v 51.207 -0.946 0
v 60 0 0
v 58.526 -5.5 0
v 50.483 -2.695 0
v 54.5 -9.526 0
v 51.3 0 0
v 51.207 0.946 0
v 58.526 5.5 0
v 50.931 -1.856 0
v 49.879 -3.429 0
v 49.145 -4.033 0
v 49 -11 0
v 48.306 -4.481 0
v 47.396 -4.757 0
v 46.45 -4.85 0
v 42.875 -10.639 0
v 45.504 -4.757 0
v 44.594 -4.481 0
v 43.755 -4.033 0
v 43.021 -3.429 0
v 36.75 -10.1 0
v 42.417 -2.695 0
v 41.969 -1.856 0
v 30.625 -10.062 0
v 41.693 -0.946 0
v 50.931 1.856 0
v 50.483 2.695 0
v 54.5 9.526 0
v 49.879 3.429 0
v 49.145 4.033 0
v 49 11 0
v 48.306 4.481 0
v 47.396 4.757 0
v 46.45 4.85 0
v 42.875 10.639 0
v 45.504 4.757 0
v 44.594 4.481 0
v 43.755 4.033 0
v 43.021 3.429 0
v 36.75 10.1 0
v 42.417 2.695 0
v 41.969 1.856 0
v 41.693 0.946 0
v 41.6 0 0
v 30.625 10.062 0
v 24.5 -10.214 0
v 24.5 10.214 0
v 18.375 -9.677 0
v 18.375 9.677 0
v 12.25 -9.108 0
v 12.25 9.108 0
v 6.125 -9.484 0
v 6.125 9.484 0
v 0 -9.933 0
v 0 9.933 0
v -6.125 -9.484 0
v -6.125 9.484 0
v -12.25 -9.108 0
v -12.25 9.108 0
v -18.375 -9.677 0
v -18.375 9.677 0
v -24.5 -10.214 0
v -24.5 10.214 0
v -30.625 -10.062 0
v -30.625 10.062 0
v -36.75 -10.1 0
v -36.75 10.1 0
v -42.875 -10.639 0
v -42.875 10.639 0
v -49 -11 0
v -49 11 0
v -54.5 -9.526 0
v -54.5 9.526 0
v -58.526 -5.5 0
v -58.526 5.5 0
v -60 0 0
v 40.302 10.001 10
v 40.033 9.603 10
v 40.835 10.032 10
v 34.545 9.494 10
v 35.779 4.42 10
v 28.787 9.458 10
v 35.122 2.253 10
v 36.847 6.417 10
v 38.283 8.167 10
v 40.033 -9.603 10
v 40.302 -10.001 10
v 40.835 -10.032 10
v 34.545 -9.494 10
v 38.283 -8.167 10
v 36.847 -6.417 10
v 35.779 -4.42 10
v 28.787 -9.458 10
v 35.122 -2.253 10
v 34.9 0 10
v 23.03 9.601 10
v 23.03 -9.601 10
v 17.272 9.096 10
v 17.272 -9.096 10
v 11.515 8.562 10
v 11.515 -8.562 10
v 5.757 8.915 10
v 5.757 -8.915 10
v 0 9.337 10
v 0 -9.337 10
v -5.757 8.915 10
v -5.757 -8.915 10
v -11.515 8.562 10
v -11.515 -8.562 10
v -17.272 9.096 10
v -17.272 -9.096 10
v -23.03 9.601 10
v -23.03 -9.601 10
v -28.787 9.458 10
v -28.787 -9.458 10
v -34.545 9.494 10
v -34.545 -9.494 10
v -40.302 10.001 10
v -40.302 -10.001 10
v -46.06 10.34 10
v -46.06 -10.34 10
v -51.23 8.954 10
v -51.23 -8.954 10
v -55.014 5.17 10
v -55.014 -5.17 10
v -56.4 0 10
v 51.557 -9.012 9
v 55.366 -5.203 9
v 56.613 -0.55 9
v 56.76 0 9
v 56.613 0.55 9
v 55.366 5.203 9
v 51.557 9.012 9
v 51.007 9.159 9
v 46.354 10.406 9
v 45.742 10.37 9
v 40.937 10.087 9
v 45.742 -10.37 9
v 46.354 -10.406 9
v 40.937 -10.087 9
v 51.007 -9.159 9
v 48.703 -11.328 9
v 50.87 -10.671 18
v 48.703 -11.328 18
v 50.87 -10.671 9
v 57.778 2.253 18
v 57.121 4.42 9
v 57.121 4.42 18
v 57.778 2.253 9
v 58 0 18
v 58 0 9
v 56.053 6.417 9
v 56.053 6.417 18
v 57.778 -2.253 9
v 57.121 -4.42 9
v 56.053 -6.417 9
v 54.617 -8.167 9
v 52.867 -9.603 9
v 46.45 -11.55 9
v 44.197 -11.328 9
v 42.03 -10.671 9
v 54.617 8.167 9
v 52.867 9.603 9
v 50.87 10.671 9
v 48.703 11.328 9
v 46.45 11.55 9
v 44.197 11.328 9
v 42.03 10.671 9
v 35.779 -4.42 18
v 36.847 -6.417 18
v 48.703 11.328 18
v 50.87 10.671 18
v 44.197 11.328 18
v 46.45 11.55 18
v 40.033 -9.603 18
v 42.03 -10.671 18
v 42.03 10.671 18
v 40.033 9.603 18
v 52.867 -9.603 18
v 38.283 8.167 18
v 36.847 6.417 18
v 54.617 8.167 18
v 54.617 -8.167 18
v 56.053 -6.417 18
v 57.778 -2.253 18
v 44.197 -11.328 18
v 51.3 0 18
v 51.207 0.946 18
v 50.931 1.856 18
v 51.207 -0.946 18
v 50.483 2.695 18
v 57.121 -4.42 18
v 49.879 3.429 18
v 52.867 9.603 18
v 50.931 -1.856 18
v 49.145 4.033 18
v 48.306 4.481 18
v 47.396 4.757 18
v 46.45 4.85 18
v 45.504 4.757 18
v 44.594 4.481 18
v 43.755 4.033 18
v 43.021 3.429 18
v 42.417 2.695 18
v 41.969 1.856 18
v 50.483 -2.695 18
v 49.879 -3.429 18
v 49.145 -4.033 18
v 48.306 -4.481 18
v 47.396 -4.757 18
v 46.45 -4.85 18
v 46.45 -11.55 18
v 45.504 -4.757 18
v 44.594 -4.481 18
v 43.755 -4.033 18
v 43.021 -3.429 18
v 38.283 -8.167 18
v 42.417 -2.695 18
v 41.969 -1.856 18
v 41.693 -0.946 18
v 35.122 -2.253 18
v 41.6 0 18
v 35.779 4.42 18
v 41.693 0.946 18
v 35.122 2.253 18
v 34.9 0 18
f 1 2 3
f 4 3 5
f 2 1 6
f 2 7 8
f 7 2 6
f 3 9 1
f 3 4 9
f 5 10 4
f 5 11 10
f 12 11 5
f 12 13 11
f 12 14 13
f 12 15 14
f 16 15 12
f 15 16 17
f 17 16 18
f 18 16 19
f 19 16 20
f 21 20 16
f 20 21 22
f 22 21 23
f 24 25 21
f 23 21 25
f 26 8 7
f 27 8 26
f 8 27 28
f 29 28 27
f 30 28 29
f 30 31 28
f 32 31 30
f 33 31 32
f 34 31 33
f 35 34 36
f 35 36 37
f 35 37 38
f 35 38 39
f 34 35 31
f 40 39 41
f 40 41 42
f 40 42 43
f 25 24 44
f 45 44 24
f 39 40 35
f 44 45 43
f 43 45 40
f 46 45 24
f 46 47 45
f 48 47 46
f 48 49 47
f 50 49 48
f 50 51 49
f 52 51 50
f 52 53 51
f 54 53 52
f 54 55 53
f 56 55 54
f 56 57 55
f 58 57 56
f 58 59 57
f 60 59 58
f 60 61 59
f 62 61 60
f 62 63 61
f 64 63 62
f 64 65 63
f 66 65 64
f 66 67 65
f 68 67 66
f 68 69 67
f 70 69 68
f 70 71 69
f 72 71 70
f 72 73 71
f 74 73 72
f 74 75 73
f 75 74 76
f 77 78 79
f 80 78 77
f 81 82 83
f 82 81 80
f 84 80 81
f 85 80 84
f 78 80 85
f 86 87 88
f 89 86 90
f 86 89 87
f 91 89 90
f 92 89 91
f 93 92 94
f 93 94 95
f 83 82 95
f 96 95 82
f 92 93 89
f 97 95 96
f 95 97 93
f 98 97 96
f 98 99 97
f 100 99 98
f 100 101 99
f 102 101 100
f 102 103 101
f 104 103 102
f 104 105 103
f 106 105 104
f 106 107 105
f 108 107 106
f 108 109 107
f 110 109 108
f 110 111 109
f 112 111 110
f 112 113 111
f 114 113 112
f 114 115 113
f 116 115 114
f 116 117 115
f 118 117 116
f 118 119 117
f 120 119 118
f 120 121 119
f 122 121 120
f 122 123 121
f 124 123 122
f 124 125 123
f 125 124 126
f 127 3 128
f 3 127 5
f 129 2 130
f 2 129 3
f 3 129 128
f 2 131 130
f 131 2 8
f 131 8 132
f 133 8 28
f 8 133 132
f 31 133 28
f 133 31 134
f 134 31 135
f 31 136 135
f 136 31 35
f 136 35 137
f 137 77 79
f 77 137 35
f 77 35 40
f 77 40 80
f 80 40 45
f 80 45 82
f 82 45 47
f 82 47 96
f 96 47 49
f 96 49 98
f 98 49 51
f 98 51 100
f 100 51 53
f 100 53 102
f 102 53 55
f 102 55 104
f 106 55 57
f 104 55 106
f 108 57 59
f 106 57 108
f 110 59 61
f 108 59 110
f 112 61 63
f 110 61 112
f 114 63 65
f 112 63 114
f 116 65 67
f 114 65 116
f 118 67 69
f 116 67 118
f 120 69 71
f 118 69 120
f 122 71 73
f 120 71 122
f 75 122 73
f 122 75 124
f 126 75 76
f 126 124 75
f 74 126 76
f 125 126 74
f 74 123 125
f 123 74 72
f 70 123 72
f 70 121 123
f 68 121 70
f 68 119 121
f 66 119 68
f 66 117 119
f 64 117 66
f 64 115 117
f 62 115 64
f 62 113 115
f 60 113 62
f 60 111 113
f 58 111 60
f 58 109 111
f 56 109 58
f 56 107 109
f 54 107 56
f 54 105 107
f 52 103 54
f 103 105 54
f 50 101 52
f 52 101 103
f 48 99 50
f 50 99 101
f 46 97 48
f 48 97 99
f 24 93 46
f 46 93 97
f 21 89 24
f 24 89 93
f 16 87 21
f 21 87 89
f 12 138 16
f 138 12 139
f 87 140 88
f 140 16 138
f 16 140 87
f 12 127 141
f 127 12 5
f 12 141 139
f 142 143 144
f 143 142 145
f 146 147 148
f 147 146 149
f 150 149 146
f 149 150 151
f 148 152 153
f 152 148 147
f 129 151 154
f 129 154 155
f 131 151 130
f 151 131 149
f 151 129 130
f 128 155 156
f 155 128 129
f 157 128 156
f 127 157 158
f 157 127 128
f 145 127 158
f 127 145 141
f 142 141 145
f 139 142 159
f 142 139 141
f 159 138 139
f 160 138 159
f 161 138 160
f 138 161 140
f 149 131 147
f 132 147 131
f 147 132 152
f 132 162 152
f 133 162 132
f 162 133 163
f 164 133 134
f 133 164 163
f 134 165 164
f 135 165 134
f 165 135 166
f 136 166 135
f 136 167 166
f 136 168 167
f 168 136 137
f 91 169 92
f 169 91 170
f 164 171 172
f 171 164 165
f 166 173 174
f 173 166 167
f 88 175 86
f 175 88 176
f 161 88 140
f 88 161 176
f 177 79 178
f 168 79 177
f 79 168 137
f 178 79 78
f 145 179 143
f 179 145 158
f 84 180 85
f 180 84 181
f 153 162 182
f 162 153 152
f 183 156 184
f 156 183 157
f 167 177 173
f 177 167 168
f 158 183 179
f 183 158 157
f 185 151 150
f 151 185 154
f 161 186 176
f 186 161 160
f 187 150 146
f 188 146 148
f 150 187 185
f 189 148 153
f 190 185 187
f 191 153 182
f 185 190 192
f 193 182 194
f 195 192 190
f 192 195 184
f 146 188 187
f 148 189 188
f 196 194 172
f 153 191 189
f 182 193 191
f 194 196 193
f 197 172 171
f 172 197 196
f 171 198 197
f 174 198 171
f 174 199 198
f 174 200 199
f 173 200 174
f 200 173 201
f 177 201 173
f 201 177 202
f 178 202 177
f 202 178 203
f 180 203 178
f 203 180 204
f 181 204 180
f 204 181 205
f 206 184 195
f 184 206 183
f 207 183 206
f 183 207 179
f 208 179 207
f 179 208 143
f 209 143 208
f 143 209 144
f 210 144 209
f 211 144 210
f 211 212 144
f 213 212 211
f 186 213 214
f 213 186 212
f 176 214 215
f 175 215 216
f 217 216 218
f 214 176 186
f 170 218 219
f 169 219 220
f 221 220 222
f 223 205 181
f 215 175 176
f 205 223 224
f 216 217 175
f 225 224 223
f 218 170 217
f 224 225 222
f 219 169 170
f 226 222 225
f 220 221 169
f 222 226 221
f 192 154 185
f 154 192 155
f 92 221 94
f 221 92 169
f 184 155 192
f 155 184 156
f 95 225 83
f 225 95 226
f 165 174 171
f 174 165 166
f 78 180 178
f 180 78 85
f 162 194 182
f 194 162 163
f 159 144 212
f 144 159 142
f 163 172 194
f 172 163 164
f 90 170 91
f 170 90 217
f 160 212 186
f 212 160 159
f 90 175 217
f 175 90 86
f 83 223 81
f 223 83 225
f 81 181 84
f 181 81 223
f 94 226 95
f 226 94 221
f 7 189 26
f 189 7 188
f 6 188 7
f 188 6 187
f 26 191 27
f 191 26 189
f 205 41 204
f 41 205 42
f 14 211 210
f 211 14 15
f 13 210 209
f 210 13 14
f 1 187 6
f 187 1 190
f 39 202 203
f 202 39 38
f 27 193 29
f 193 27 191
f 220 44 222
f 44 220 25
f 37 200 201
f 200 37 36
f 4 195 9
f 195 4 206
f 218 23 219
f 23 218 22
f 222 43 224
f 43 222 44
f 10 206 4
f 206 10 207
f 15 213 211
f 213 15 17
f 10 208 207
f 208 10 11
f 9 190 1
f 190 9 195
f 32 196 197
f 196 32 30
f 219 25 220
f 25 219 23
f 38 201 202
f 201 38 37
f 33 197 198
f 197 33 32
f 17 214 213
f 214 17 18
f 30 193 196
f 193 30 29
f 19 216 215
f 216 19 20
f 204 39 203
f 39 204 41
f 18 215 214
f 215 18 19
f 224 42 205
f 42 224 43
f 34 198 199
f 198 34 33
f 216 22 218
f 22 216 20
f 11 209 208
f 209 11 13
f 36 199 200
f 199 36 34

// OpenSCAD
$fn = 32;

// ----------------------------------------------------------------------
// Handle: 120 x 22 mm grip, 10 mm thick
// ----------------------------------------------------------------------

// --- parameters (mm) ---
length = 120;             // grip length
width = 22;               // grip width
thickness = 10;           // grip thickness
waist = 0.86;             // width factor at the middle
draft = 0.94;             // top face scale of the extrusion
scallops = 4;             // finger rests per side
ripple = 0.05;            // depth factor of the finger rests
boss_d = 23.1;            // mounting boss diameter
boss_h = 8;               // mounting boss height
boss_hole_d = 9.7;        // screw clearance through the boss
boss_r = 46.45;           // boss centre from the grip centre

/* ergonomic grip outline, closed spline-like polygon in the XY plane */
grip = [[-49, 11], [-42.875, 10.639], [-36.75, 10.1], [-30.625, 10.062], [-24.5, 10.214], [-18.375, 9.677], [-12.25, 9.108], [-6.125, 9.484], [0, 9.933], [6.125, 9.484], [12.25, 9.108], [18.375, 9.677], [24.5, 10.214], [30.625, 10.062], [36.75, 10.1], [42.875, 10.639], [49, 11], [54.5, 9.526], [58.526, 5.5], [60, 0], [58.526, -5.5], [54.5, -9.526], [49, -11], [49, -11], [42.875, -10.639], [36.75, -10.1], [30.625, -10.062], [24.5, -10.214], [18.375, -9.677], [12.25, -9.108], [6.125, -9.484], [0, -9.933], [-6.125, -9.484], [-12.25, -9.108], [-18.375, -9.677], [-24.5, -10.214], [-30.625, -10.062], [-36.75, -10.1], [-42.875, -10.639], [-49, -11], [-54.5, -9.526], [-58.526, -5.5], [-60, 0], [-58.526, 5.5], [-54.5, 9.526], [-49, 11]];

module grip_body() {
  linear_extrude(height = thickness, scale = draft) polygon(grip);
}

module boss_body() {
  /* sunk 1 mm into the grip so the joint overlaps */
  translate([boss_r, 0, thickness - 1]) cylinder(h = boss_h + 1, d = boss_d);
}

difference() {
  union() {
    grip_body();
    boss_body();
  }
  translate([boss_r, 0, -1]) cylinder(h = thickness + boss_h + 2, d = boss_hole_d);
}
